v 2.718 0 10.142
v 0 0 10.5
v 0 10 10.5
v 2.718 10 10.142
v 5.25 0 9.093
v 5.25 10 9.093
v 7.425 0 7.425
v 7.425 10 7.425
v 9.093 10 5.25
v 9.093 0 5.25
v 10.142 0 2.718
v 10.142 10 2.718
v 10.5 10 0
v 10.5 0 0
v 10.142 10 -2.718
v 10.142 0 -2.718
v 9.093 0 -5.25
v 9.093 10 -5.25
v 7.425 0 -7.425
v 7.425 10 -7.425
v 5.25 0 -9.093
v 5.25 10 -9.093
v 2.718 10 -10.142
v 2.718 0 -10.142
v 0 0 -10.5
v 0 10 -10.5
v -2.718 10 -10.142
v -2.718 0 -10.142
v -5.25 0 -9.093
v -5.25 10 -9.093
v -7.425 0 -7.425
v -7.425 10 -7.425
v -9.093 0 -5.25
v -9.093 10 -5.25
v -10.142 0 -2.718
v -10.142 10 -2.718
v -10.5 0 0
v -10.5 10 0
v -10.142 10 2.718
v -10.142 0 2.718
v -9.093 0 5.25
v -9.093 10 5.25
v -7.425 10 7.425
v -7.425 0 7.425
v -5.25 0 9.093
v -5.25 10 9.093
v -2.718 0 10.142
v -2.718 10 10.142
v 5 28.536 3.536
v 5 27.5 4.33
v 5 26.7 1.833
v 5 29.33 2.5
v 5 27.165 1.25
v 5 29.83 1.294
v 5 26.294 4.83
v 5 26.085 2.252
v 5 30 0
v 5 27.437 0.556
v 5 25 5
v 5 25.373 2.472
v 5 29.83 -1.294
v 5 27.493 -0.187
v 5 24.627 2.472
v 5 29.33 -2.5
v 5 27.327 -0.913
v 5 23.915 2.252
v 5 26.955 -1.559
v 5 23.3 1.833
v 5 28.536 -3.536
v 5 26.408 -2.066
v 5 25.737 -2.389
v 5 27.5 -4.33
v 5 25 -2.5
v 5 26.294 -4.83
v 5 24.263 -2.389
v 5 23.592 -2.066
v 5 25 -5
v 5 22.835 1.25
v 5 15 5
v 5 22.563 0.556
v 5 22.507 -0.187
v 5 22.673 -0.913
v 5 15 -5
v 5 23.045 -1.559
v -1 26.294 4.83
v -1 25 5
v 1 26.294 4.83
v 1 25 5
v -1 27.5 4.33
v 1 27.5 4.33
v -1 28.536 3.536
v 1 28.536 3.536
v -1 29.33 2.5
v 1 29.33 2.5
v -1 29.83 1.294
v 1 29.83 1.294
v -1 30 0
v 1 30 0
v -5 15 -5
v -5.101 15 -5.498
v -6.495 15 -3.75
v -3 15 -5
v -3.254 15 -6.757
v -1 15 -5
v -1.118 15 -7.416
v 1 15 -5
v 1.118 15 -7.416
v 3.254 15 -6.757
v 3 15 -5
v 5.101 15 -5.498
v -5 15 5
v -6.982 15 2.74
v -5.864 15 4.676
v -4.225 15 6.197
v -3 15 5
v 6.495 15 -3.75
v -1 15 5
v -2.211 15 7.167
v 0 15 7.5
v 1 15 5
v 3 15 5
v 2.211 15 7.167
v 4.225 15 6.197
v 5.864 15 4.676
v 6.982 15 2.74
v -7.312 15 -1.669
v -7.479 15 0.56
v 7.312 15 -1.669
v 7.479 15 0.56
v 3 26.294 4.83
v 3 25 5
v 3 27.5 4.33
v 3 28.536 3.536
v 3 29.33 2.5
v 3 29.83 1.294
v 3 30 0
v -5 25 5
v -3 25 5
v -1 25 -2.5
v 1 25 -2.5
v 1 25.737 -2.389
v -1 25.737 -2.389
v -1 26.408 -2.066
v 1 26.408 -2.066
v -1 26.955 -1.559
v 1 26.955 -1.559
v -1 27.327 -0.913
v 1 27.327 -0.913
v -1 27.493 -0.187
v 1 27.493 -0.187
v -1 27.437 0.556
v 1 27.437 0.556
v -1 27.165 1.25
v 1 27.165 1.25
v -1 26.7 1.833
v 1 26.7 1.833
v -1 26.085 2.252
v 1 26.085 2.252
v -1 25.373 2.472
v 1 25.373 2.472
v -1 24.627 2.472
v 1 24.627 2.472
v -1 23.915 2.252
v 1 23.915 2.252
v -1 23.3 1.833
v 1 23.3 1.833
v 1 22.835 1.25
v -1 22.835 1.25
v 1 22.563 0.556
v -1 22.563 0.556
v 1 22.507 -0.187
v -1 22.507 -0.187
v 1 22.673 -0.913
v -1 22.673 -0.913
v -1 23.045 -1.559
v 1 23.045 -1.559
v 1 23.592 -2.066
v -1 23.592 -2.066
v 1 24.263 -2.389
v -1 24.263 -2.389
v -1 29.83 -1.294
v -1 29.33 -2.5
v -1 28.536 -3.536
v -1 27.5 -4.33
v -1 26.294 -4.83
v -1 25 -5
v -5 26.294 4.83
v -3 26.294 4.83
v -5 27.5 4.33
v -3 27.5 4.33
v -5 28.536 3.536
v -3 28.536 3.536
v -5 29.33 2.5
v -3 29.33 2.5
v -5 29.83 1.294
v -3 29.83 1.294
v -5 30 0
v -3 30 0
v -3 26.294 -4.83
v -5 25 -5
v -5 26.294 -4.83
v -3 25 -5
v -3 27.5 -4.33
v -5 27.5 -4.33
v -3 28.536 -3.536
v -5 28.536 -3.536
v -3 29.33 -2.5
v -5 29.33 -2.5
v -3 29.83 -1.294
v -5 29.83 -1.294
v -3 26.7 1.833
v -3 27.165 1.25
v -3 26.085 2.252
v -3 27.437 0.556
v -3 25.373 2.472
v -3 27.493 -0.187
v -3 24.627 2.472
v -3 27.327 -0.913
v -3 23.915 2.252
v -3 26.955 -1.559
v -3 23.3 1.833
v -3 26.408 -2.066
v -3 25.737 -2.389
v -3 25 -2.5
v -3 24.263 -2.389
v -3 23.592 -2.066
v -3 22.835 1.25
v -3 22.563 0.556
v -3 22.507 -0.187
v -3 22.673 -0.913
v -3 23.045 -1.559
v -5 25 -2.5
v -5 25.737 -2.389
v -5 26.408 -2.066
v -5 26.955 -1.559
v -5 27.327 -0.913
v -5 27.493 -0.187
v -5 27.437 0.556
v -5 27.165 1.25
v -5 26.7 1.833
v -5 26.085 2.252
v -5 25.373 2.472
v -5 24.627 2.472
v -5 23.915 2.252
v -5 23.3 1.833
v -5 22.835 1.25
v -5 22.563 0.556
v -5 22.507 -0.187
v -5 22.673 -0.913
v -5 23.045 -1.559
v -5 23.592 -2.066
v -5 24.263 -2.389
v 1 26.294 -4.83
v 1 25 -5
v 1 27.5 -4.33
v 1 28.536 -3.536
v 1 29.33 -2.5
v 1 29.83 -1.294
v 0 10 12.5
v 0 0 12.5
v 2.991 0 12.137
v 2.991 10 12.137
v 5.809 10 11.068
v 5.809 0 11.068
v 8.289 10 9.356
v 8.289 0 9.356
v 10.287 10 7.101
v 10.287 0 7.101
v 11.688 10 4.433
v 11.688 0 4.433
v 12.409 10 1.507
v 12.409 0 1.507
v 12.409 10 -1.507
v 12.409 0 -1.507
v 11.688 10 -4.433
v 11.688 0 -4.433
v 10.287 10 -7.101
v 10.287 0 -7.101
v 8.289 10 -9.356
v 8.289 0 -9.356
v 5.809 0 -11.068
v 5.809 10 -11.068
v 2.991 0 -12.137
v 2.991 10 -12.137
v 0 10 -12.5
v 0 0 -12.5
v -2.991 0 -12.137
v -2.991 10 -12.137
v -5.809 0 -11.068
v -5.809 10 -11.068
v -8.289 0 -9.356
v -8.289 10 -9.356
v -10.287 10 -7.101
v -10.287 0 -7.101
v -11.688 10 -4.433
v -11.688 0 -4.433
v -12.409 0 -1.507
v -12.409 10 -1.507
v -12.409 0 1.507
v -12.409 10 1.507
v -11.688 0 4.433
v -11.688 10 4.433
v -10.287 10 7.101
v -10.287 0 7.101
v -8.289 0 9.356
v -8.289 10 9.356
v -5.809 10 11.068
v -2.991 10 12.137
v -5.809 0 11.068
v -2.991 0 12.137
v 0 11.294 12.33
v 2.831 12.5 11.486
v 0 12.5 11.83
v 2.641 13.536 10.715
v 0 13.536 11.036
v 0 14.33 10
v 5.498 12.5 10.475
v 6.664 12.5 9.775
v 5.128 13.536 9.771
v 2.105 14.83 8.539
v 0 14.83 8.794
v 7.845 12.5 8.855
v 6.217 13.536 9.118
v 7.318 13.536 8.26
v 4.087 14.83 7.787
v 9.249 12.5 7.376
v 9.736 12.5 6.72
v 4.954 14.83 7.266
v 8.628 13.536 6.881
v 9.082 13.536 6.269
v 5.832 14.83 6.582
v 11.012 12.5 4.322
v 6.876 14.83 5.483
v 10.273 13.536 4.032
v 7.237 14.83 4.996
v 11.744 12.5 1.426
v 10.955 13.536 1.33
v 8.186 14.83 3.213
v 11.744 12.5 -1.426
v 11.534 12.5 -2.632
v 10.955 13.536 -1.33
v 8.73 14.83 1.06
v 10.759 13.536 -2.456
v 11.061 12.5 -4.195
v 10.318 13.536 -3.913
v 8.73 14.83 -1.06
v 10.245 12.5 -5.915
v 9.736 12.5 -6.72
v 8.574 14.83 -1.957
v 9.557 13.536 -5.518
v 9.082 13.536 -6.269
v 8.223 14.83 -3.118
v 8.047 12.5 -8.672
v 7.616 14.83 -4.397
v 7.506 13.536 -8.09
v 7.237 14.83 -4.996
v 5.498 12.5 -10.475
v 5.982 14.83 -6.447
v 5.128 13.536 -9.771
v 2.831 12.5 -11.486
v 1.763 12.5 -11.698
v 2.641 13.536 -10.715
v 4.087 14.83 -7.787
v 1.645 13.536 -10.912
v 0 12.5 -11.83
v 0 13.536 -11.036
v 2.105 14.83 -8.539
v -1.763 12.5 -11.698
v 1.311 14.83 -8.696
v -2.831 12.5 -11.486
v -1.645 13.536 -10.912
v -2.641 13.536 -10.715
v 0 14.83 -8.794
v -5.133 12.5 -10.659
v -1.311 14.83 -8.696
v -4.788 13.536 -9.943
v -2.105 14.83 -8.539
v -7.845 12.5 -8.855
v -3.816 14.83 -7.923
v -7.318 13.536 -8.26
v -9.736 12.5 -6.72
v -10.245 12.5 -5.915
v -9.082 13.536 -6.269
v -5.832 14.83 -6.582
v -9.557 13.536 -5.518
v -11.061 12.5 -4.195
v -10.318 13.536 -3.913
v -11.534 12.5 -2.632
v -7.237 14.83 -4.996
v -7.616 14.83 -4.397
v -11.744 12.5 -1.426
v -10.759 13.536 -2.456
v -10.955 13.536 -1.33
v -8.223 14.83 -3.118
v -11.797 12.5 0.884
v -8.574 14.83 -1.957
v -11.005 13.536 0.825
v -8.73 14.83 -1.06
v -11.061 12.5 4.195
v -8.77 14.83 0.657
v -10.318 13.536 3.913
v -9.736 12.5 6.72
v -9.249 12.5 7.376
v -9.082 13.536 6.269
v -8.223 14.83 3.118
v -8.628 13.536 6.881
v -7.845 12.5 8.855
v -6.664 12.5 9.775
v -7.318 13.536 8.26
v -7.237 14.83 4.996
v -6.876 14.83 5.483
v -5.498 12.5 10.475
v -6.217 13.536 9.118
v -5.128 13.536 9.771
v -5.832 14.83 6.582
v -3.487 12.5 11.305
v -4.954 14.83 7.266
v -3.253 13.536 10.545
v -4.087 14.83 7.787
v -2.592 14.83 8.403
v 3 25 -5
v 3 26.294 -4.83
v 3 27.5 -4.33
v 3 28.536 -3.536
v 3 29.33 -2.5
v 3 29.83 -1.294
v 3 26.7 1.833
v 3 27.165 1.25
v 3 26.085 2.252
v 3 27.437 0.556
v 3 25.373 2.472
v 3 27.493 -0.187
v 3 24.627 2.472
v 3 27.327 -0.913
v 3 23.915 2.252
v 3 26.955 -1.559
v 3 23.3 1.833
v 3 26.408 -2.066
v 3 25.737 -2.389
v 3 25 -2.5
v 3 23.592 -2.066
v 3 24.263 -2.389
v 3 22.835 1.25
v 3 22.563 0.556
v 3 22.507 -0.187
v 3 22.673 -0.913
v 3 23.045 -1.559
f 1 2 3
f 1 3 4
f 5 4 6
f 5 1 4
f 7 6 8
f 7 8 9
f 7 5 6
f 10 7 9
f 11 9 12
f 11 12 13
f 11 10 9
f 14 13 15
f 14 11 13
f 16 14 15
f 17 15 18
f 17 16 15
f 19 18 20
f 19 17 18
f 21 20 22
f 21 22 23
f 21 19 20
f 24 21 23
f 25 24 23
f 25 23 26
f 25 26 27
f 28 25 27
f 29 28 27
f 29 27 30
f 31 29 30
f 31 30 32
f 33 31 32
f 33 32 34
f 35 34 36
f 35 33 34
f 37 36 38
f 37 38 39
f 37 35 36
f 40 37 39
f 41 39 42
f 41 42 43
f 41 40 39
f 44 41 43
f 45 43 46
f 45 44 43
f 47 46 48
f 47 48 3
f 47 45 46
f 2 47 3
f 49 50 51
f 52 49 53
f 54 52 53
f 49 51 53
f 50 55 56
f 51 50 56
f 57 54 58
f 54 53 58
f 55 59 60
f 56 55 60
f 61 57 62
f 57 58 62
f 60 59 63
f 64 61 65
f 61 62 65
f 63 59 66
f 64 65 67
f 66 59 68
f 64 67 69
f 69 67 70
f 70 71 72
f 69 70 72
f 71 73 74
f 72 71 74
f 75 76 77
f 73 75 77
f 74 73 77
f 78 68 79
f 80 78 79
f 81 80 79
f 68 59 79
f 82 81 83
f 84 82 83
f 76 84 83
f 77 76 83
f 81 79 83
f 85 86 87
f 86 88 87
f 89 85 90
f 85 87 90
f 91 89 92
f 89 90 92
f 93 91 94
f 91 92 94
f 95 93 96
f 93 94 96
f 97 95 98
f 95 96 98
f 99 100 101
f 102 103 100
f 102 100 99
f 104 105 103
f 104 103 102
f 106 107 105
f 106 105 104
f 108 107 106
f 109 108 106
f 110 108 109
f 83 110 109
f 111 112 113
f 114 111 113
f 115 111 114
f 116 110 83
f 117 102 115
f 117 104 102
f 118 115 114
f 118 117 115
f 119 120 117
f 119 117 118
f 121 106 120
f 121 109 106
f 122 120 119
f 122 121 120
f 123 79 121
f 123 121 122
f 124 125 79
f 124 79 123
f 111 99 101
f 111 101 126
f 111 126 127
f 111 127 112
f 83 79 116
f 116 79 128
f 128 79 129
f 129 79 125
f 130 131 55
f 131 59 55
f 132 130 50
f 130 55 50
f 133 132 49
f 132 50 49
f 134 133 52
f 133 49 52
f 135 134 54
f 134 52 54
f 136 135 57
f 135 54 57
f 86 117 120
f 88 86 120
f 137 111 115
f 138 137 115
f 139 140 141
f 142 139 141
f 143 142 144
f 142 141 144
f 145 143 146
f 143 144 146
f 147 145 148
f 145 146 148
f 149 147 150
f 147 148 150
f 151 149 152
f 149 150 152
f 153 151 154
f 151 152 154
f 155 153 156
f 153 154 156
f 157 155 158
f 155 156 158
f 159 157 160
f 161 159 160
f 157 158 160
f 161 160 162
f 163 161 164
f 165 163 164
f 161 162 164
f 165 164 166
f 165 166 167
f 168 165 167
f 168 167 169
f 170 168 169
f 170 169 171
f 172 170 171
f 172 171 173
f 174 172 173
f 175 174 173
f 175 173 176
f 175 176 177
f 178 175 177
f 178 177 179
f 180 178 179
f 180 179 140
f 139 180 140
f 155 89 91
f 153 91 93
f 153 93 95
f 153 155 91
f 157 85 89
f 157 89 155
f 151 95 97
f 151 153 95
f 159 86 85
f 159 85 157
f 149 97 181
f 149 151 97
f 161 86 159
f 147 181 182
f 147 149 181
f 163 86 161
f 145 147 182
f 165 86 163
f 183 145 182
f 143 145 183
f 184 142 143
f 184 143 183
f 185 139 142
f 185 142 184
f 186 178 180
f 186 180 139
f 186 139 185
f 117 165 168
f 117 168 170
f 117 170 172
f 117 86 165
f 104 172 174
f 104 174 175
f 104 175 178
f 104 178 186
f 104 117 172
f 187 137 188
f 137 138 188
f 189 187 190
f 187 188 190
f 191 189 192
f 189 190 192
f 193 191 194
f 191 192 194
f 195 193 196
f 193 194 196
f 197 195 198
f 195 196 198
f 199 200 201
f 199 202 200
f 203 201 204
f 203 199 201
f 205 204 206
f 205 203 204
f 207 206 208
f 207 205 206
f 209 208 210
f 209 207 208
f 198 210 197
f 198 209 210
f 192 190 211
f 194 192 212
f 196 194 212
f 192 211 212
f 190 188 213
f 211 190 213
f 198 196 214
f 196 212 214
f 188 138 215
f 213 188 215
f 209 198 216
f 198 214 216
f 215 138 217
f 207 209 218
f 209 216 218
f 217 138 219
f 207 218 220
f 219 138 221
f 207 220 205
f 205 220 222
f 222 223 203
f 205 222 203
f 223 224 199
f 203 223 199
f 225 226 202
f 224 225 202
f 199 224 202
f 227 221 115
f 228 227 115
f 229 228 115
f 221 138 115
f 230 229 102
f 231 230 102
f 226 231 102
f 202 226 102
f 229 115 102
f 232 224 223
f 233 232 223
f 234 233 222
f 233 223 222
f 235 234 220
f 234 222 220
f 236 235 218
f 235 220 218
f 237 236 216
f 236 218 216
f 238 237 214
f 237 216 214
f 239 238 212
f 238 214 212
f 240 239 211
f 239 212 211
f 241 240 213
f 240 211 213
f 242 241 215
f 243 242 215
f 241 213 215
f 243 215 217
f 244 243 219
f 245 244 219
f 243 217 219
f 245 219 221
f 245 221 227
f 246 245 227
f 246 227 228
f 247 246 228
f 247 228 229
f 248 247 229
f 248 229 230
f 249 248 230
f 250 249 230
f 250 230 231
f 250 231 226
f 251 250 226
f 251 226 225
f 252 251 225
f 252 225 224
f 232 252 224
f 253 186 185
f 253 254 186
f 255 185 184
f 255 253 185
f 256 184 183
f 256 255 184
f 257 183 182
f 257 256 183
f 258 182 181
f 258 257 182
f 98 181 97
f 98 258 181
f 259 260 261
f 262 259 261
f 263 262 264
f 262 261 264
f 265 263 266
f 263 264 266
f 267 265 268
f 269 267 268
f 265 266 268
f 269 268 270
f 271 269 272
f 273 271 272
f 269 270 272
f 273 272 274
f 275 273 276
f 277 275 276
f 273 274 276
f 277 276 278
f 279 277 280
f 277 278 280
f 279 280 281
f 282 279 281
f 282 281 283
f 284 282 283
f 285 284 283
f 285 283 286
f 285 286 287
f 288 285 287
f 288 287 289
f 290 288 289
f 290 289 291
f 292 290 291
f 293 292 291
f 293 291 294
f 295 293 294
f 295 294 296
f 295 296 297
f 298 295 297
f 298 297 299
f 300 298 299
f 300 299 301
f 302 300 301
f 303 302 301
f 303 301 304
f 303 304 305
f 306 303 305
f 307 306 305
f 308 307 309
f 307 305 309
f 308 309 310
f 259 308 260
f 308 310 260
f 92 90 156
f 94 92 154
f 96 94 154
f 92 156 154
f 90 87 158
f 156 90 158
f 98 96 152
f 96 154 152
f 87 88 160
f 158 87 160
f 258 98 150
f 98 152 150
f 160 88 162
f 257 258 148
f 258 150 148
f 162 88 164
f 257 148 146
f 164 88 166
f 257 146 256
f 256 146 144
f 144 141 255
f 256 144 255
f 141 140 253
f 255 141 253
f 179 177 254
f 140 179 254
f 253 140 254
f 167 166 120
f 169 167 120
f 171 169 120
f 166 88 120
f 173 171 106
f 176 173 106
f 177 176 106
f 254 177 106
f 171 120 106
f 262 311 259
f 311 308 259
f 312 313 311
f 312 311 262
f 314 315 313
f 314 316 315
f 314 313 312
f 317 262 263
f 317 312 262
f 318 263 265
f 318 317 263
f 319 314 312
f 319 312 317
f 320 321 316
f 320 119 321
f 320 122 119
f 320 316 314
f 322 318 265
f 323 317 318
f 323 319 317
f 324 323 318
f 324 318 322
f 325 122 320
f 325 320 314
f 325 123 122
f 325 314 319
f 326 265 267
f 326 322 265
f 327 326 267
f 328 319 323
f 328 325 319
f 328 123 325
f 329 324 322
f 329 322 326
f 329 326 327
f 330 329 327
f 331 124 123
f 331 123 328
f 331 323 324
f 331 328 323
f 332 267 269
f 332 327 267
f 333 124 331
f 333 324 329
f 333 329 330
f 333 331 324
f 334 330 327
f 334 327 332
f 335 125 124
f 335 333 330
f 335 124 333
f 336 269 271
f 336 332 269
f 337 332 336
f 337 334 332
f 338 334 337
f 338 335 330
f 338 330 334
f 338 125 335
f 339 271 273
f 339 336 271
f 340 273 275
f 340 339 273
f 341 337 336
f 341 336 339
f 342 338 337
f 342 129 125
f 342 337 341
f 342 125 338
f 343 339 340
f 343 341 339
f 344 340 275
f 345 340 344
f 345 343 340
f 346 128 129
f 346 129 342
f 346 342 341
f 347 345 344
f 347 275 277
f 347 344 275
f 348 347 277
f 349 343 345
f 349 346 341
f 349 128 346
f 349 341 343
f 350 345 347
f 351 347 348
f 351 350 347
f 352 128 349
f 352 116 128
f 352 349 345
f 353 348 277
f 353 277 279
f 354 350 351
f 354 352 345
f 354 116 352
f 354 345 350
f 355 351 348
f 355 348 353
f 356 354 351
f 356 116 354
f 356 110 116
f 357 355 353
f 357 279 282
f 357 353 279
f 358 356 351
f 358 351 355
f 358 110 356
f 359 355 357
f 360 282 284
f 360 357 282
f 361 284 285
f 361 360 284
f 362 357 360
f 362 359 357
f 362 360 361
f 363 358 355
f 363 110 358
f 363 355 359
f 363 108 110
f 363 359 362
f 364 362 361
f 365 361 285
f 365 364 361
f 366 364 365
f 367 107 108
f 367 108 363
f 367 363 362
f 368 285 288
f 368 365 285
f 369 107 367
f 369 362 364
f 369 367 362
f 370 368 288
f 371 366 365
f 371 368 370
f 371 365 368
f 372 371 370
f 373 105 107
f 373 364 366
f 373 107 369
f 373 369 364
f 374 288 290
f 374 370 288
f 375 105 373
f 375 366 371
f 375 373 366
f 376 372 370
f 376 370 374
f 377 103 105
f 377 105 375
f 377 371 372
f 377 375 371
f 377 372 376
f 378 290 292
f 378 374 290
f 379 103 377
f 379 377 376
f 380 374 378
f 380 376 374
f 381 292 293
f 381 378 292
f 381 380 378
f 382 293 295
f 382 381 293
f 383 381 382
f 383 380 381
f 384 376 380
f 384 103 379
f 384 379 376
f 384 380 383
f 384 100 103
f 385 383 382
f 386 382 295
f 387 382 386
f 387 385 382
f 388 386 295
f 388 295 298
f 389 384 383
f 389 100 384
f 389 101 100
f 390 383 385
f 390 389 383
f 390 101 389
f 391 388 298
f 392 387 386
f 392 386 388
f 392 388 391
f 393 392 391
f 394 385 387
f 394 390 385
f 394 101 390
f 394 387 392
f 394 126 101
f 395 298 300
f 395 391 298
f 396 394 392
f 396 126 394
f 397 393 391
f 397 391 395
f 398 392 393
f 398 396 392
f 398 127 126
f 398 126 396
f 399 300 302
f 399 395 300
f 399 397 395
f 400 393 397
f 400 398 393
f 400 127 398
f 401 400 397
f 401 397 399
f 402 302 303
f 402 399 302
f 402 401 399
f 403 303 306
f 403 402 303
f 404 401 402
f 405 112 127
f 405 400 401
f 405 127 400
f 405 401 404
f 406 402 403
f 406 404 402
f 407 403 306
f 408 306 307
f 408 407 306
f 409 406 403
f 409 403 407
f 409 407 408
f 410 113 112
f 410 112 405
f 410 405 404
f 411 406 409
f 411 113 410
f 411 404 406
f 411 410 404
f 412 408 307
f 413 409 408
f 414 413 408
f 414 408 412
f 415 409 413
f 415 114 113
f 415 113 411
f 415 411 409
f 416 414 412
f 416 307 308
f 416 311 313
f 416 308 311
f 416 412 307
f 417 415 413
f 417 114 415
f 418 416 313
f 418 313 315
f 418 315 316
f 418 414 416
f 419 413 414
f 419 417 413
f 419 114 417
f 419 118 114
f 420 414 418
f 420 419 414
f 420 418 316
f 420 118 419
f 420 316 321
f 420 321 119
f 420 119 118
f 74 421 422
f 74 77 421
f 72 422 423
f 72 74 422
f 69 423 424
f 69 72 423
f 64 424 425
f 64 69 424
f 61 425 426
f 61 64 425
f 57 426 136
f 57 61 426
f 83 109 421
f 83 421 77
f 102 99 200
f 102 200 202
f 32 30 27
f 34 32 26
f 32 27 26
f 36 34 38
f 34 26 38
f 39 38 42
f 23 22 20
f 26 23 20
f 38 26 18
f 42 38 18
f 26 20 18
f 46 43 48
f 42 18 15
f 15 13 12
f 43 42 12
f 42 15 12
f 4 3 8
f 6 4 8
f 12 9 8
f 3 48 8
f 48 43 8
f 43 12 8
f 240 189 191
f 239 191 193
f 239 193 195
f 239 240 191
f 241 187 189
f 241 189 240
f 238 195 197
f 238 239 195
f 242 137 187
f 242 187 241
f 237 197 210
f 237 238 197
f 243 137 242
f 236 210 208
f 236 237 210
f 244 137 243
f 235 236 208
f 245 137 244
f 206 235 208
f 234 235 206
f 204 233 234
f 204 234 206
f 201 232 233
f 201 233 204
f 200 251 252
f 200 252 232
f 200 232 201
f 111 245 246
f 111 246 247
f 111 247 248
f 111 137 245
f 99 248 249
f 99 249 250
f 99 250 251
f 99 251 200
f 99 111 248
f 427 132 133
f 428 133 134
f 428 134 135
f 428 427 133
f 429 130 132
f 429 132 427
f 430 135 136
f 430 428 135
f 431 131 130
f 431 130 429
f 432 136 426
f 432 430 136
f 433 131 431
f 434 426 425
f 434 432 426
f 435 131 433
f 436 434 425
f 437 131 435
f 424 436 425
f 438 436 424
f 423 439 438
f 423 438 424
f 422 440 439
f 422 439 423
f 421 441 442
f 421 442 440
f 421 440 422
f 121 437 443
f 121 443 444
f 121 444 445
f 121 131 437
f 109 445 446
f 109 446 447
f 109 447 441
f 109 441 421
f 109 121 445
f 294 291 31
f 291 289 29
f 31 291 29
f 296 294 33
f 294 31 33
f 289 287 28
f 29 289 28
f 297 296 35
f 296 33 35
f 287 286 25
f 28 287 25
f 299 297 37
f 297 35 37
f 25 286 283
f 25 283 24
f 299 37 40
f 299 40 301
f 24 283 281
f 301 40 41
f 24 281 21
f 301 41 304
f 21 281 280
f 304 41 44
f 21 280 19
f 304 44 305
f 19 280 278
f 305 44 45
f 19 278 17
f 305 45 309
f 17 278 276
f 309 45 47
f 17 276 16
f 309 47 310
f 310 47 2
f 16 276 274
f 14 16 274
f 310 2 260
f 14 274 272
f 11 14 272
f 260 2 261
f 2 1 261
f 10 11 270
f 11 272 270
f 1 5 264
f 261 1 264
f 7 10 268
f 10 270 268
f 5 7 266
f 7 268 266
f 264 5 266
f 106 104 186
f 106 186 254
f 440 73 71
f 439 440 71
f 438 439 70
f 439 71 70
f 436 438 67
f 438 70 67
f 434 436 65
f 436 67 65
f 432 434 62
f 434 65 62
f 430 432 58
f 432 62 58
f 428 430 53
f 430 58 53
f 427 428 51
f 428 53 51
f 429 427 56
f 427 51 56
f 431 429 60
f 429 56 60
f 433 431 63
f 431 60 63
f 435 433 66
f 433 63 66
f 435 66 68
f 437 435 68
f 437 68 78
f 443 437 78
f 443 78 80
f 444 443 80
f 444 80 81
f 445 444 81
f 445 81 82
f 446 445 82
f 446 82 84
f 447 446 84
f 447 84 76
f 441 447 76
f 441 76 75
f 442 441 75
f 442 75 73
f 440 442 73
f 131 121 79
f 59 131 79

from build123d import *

# Parameters (mm, degrees)
SKETCH1_R           = 12.5
SKETCH1_R_2         = 10.5
BOSS_EXTRUDE1_DEPTH = 10
SKETCH2_R           = 12.5
BOSS_EXTRUDE2_DEPTH = 5
SKETCH3_W           = 2
SKETCH3_H           = 10
BOSS_EXTRUDE3_DEPTH = 15
FILLET1_R           = 5
FILLET2_R           = 5
SKETCH4_R           = 2.5
CUT_EXTRUDE1_DEPTH  = 15


with BuildPart() as part:
    # Sketch1 → Boss-Extrude1 (new body)
    with BuildSketch(Plane(origin=(0, 0, 0), x_dir=(1, 0, 0), z_dir=(0, 1, 0))):
        with Locations(Location((0, 0, 0), (0, 0, 270))):
            Circle(SKETCH1_R)
        with Locations(Location((0, 0, 0), (0, 0, 270))):
            Circle(SKETCH1_R_2, mode=Mode.SUBTRACT)
    extrude(amount=BOSS_EXTRUDE1_DEPTH)

    # Sketch2 → Boss-Extrude2 (add)
    with BuildSketch(Plane(origin=(0, 10, 0), x_dir=(1, 0, 0), z_dir=(0, 1, 0))):
        with Locations(Location((0, 0, 0), (0, 0, 270))):
            Circle(SKETCH2_R)
    extrude(amount=BOSS_EXTRUDE2_DEPTH)

    # Sketch3 → Boss-Extrude3 (add)
    with BuildSketch(Plane(origin=(0, 15, 0), x_dir=(1, 0, 0), z_dir=(0, 1, 0))):
        with Locations((4, 0)):
            Rectangle(SKETCH3_W, SKETCH3_H)
        Rectangle(SKETCH3_W, SKETCH3_H)
        with Locations((-4, 0)):
            Rectangle(SKETCH3_W, SKETCH3_H)
    extrude(amount=BOSS_EXTRUDE3_DEPTH)

    # Fillet1
    fillet1_edges = [part.edges().sort_by_distance(p)[0] for p in [
        (0, 15, -12.5),
    ]]
    fillet(fillet1_edges, radius=FILLET1_R)

    # Fillet2
    fillet2_edges = [part.edges().sort_by_distance(p)[0] for p in [
        (-4, 30, -5),
        (0, 30, -5),
        (4, 30, -5),
        (-4, 30, 5),
        (0, 30, 5),
        (4, 30, 5),
    ]]
    fillet(fillet2_edges, radius=FILLET2_R - 0.0001)  # a hair under: the kernel refuses the full size

    # Sketch4 → Cut-Extrude1 (cut)
    with BuildSketch(Plane(origin=(5, 0, 0), x_dir=(0, 0, -1), z_dir=(1, 0, 0))):
        with Locations((0, 25)):
            Circle(SKETCH4_R)
    extrude(amount=-CUT_EXTRUDE1_DEPTH, mode=Mode.SUBTRACT)


solid = part.part
